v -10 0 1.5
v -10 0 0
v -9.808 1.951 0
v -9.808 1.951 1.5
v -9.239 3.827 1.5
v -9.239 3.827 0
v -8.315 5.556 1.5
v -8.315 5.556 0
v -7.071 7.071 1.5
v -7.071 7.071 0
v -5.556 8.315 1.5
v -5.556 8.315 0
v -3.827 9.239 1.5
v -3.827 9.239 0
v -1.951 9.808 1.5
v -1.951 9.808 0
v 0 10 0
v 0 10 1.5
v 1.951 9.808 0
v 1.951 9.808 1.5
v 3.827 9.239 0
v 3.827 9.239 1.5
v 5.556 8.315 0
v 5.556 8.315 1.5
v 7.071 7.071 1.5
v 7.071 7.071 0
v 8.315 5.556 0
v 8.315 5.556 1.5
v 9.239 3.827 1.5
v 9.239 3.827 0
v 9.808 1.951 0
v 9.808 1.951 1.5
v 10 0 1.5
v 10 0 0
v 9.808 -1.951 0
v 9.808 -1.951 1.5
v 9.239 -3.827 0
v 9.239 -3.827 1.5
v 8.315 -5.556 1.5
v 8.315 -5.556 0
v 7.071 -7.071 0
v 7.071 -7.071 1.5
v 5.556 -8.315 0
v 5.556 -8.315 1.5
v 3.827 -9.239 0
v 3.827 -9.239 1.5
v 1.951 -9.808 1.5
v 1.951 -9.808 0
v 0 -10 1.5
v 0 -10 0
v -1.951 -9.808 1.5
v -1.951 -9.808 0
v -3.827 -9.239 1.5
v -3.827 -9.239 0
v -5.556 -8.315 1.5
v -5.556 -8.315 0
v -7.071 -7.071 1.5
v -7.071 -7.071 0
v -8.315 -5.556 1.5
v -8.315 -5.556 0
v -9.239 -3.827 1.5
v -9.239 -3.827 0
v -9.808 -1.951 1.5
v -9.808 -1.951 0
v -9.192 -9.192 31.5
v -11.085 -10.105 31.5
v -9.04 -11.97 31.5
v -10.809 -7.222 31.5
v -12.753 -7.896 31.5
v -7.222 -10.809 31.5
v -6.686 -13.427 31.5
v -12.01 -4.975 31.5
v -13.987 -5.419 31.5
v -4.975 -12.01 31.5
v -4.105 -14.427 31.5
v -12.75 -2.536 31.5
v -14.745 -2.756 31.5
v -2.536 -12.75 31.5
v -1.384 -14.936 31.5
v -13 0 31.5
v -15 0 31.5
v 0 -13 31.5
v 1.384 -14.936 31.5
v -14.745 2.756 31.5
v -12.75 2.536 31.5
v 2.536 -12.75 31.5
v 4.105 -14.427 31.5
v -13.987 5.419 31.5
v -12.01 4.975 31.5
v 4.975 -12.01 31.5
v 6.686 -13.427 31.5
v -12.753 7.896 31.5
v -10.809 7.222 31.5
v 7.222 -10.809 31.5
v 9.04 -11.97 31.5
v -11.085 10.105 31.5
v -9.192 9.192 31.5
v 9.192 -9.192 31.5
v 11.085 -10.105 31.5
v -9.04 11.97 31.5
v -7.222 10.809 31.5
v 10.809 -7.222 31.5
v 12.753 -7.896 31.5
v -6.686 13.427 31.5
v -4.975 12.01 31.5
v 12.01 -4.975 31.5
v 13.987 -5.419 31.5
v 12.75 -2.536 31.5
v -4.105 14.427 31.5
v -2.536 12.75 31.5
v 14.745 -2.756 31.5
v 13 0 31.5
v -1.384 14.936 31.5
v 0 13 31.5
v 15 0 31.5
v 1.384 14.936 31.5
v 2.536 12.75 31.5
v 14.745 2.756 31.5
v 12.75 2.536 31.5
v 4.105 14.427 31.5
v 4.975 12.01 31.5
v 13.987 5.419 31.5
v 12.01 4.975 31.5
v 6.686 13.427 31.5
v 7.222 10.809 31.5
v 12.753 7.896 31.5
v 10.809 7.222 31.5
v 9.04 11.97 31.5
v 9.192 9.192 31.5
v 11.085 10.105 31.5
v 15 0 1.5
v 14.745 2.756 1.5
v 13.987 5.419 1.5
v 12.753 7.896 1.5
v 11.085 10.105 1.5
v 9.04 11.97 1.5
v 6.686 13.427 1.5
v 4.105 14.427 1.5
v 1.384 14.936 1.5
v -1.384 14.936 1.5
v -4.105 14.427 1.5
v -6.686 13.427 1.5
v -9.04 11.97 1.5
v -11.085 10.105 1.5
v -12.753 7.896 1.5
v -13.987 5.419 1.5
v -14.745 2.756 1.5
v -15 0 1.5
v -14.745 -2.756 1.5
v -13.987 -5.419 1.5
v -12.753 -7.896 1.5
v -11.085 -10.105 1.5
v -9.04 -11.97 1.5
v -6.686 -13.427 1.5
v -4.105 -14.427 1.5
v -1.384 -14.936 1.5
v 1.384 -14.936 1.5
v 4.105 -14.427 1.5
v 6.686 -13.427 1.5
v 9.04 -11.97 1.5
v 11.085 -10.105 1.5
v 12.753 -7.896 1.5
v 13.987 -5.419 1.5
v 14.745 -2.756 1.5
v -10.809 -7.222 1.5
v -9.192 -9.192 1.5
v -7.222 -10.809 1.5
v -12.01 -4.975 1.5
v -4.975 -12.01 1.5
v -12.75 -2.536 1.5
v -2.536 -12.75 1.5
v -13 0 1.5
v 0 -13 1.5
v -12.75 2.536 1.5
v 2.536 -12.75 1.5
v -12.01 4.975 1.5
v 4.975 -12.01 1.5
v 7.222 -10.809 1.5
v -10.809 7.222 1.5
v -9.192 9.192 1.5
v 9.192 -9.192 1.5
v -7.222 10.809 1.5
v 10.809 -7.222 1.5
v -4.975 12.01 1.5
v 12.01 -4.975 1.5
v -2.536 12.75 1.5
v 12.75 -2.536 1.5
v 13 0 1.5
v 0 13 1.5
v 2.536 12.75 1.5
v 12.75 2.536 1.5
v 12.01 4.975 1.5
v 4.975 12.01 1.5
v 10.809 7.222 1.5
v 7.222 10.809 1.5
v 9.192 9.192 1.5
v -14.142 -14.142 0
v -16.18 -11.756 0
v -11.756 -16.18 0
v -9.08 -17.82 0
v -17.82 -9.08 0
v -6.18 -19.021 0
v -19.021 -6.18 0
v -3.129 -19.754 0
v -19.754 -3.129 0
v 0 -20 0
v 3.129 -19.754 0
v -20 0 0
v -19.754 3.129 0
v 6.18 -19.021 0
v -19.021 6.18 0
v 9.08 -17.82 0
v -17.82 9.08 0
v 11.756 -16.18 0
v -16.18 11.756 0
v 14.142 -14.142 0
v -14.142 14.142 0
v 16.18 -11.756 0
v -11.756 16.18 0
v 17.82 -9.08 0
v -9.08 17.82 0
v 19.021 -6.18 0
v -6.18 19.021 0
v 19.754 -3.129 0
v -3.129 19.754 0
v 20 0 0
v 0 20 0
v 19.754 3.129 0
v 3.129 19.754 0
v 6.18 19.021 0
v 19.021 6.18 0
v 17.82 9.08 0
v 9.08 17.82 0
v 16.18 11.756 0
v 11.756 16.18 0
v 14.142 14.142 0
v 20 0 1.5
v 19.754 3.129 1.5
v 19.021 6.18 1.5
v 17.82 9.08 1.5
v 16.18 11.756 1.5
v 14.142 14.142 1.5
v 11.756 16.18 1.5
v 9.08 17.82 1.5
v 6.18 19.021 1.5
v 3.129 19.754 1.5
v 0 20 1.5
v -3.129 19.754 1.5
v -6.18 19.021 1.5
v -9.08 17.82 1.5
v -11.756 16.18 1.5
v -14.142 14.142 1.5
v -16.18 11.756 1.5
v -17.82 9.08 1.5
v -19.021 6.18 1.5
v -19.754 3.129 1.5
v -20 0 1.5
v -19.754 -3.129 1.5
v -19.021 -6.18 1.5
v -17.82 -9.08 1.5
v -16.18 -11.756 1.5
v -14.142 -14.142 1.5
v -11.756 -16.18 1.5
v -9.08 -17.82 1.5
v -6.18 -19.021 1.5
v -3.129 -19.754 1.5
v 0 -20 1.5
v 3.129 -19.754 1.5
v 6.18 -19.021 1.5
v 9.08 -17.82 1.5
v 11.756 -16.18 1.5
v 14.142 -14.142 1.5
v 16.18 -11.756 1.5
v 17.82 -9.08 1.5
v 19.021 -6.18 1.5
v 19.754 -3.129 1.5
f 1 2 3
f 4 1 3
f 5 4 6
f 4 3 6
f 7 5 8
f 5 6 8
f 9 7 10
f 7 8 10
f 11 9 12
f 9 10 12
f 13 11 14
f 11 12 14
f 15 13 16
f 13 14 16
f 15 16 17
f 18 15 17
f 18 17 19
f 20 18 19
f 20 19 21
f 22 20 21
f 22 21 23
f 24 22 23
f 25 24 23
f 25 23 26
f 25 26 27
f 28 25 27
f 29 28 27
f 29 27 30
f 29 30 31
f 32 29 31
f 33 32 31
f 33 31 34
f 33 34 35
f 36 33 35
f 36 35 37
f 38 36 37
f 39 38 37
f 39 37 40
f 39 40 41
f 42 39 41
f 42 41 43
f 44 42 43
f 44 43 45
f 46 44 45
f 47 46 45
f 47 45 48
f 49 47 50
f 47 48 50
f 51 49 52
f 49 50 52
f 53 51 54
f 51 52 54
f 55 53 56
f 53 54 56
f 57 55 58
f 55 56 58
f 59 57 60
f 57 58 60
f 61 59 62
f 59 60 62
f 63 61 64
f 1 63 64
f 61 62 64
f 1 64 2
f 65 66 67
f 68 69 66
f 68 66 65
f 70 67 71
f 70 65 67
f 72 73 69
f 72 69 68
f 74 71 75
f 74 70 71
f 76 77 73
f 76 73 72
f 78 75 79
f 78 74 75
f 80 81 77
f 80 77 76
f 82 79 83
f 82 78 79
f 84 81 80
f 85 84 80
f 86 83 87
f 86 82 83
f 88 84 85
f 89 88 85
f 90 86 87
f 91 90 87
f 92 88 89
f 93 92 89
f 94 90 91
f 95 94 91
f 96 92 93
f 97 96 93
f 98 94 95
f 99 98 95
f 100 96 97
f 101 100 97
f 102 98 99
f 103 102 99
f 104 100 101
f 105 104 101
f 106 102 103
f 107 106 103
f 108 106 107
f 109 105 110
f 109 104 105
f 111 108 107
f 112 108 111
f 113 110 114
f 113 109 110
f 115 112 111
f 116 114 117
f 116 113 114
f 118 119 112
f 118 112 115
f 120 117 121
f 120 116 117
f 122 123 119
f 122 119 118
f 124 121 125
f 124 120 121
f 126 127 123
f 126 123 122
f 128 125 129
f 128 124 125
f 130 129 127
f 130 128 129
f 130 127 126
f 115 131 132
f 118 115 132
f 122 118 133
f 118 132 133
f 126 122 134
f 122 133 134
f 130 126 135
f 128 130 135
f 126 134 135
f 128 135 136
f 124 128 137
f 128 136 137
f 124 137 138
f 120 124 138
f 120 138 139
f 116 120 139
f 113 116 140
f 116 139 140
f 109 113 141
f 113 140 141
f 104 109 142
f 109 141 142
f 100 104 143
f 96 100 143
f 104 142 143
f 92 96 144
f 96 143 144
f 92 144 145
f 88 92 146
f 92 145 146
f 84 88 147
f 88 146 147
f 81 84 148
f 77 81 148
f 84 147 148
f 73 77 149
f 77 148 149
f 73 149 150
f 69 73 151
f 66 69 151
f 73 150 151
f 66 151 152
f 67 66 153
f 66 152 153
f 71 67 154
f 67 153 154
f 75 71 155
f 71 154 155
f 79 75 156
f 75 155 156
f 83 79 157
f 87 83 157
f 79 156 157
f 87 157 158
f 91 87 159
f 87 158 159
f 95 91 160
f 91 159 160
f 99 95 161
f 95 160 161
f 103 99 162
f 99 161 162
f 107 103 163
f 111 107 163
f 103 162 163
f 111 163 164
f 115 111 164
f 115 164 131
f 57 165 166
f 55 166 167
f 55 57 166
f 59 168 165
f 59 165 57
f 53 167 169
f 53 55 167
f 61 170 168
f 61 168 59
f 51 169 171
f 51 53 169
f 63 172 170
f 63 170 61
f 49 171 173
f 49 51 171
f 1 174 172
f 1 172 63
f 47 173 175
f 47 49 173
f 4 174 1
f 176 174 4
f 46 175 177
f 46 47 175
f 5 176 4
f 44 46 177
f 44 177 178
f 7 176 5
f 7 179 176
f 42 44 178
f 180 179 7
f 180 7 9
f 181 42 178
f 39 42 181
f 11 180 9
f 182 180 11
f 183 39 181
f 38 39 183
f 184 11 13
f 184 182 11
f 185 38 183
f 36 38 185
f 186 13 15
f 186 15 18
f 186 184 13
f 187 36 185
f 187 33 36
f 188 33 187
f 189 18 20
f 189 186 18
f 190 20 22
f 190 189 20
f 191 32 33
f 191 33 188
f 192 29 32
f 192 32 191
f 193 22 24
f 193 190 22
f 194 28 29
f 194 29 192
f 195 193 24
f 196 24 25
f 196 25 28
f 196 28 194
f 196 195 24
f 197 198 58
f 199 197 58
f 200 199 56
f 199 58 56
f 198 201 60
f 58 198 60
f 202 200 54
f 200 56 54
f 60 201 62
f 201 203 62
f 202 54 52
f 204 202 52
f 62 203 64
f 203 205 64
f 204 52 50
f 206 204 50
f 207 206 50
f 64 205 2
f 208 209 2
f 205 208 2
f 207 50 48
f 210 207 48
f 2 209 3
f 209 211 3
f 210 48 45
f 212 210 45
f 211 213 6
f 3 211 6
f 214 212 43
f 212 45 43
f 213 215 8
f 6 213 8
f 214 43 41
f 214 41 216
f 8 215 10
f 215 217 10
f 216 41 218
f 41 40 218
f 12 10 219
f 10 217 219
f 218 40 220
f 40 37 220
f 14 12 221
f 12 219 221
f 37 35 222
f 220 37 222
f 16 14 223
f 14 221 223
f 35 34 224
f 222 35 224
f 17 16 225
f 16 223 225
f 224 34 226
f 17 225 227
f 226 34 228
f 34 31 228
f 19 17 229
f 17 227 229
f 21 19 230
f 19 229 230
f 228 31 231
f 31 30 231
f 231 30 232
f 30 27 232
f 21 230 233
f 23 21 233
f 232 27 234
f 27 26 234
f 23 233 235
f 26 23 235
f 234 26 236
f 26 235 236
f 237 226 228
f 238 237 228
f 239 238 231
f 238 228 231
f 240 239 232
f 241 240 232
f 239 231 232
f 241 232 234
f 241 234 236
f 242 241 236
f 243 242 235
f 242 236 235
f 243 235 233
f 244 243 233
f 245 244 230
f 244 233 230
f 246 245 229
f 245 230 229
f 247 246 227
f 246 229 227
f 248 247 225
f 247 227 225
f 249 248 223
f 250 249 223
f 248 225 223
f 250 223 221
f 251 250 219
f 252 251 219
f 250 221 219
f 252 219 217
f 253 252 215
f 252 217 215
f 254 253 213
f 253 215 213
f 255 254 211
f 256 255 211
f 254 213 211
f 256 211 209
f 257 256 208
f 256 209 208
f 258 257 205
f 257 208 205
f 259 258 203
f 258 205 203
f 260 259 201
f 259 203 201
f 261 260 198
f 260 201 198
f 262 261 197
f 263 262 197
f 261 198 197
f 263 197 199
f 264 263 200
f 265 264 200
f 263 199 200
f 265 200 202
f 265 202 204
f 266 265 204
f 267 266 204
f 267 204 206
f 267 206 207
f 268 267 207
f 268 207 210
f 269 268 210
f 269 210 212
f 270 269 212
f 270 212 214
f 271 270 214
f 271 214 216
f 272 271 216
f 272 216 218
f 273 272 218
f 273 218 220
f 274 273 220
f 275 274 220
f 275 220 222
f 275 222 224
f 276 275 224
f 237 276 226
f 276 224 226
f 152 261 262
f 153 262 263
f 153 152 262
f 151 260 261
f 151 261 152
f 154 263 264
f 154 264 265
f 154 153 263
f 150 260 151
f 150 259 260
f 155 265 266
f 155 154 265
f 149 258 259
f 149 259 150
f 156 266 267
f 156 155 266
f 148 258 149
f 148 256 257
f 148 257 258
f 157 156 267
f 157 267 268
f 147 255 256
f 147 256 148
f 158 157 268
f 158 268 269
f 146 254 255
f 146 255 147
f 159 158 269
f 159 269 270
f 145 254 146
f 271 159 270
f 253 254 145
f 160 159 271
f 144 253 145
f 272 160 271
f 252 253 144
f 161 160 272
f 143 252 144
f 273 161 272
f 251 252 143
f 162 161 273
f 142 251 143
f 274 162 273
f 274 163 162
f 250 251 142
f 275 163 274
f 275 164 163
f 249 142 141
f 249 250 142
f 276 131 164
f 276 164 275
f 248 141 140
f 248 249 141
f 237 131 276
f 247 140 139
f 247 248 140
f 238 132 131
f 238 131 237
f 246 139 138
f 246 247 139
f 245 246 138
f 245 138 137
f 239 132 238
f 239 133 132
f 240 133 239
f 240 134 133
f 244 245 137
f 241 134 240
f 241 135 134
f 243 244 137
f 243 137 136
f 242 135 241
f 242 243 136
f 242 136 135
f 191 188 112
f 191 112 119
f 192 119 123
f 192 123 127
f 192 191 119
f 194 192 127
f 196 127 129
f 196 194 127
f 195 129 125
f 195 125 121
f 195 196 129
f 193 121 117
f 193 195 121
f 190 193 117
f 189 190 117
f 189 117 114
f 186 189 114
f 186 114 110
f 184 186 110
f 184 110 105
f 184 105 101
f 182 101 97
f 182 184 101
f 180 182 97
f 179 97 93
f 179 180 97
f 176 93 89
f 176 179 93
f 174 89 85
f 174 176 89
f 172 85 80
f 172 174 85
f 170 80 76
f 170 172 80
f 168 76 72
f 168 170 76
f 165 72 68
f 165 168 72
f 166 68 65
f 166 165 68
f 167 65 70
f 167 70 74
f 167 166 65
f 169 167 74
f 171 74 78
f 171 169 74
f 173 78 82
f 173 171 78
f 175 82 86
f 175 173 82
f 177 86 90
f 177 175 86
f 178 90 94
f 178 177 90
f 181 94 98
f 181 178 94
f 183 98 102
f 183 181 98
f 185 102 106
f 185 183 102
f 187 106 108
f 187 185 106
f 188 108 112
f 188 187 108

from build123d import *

# Parameters (mm, degrees)
SKETCH1_R           = 20
BOSS_EXTRUDE1_DEPTH = 1.5
SKETCH2_R           = 15
SKETCH2_R_2         = 13
BOSS_EXTRUDE2_DEPTH = 30
SKETCH3_R           = 10
CUT_EXTRUDE1_DEPTH  = 30


with BuildPart() as part:
    # Sketch1 → Boss-Extrude1 (new body)
    with BuildSketch(Plane.XY):
        Circle(SKETCH1_R)
    extrude(amount=BOSS_EXTRUDE1_DEPTH)

    # Sketch2 → Boss-Extrude2 (add)
    with BuildSketch(Plane.XY.offset(1.5)):
        Circle(SKETCH2_R)
        Circle(SKETCH2_R_2, mode=Mode.SUBTRACT)
    extrude(amount=BOSS_EXTRUDE2_DEPTH)

    # Sketch3 → Cut-Extrude1 (cut)
    with BuildSketch(Plane(origin=(0, 0, 0), x_dir=(-1, 0, 0), z_dir=(0, 0, -1))):
        Circle(SKETCH3_R)
    extrude(amount=-CUT_EXTRUDE1_DEPTH, mode=Mode.SUBTRACT)


solid = part.part
